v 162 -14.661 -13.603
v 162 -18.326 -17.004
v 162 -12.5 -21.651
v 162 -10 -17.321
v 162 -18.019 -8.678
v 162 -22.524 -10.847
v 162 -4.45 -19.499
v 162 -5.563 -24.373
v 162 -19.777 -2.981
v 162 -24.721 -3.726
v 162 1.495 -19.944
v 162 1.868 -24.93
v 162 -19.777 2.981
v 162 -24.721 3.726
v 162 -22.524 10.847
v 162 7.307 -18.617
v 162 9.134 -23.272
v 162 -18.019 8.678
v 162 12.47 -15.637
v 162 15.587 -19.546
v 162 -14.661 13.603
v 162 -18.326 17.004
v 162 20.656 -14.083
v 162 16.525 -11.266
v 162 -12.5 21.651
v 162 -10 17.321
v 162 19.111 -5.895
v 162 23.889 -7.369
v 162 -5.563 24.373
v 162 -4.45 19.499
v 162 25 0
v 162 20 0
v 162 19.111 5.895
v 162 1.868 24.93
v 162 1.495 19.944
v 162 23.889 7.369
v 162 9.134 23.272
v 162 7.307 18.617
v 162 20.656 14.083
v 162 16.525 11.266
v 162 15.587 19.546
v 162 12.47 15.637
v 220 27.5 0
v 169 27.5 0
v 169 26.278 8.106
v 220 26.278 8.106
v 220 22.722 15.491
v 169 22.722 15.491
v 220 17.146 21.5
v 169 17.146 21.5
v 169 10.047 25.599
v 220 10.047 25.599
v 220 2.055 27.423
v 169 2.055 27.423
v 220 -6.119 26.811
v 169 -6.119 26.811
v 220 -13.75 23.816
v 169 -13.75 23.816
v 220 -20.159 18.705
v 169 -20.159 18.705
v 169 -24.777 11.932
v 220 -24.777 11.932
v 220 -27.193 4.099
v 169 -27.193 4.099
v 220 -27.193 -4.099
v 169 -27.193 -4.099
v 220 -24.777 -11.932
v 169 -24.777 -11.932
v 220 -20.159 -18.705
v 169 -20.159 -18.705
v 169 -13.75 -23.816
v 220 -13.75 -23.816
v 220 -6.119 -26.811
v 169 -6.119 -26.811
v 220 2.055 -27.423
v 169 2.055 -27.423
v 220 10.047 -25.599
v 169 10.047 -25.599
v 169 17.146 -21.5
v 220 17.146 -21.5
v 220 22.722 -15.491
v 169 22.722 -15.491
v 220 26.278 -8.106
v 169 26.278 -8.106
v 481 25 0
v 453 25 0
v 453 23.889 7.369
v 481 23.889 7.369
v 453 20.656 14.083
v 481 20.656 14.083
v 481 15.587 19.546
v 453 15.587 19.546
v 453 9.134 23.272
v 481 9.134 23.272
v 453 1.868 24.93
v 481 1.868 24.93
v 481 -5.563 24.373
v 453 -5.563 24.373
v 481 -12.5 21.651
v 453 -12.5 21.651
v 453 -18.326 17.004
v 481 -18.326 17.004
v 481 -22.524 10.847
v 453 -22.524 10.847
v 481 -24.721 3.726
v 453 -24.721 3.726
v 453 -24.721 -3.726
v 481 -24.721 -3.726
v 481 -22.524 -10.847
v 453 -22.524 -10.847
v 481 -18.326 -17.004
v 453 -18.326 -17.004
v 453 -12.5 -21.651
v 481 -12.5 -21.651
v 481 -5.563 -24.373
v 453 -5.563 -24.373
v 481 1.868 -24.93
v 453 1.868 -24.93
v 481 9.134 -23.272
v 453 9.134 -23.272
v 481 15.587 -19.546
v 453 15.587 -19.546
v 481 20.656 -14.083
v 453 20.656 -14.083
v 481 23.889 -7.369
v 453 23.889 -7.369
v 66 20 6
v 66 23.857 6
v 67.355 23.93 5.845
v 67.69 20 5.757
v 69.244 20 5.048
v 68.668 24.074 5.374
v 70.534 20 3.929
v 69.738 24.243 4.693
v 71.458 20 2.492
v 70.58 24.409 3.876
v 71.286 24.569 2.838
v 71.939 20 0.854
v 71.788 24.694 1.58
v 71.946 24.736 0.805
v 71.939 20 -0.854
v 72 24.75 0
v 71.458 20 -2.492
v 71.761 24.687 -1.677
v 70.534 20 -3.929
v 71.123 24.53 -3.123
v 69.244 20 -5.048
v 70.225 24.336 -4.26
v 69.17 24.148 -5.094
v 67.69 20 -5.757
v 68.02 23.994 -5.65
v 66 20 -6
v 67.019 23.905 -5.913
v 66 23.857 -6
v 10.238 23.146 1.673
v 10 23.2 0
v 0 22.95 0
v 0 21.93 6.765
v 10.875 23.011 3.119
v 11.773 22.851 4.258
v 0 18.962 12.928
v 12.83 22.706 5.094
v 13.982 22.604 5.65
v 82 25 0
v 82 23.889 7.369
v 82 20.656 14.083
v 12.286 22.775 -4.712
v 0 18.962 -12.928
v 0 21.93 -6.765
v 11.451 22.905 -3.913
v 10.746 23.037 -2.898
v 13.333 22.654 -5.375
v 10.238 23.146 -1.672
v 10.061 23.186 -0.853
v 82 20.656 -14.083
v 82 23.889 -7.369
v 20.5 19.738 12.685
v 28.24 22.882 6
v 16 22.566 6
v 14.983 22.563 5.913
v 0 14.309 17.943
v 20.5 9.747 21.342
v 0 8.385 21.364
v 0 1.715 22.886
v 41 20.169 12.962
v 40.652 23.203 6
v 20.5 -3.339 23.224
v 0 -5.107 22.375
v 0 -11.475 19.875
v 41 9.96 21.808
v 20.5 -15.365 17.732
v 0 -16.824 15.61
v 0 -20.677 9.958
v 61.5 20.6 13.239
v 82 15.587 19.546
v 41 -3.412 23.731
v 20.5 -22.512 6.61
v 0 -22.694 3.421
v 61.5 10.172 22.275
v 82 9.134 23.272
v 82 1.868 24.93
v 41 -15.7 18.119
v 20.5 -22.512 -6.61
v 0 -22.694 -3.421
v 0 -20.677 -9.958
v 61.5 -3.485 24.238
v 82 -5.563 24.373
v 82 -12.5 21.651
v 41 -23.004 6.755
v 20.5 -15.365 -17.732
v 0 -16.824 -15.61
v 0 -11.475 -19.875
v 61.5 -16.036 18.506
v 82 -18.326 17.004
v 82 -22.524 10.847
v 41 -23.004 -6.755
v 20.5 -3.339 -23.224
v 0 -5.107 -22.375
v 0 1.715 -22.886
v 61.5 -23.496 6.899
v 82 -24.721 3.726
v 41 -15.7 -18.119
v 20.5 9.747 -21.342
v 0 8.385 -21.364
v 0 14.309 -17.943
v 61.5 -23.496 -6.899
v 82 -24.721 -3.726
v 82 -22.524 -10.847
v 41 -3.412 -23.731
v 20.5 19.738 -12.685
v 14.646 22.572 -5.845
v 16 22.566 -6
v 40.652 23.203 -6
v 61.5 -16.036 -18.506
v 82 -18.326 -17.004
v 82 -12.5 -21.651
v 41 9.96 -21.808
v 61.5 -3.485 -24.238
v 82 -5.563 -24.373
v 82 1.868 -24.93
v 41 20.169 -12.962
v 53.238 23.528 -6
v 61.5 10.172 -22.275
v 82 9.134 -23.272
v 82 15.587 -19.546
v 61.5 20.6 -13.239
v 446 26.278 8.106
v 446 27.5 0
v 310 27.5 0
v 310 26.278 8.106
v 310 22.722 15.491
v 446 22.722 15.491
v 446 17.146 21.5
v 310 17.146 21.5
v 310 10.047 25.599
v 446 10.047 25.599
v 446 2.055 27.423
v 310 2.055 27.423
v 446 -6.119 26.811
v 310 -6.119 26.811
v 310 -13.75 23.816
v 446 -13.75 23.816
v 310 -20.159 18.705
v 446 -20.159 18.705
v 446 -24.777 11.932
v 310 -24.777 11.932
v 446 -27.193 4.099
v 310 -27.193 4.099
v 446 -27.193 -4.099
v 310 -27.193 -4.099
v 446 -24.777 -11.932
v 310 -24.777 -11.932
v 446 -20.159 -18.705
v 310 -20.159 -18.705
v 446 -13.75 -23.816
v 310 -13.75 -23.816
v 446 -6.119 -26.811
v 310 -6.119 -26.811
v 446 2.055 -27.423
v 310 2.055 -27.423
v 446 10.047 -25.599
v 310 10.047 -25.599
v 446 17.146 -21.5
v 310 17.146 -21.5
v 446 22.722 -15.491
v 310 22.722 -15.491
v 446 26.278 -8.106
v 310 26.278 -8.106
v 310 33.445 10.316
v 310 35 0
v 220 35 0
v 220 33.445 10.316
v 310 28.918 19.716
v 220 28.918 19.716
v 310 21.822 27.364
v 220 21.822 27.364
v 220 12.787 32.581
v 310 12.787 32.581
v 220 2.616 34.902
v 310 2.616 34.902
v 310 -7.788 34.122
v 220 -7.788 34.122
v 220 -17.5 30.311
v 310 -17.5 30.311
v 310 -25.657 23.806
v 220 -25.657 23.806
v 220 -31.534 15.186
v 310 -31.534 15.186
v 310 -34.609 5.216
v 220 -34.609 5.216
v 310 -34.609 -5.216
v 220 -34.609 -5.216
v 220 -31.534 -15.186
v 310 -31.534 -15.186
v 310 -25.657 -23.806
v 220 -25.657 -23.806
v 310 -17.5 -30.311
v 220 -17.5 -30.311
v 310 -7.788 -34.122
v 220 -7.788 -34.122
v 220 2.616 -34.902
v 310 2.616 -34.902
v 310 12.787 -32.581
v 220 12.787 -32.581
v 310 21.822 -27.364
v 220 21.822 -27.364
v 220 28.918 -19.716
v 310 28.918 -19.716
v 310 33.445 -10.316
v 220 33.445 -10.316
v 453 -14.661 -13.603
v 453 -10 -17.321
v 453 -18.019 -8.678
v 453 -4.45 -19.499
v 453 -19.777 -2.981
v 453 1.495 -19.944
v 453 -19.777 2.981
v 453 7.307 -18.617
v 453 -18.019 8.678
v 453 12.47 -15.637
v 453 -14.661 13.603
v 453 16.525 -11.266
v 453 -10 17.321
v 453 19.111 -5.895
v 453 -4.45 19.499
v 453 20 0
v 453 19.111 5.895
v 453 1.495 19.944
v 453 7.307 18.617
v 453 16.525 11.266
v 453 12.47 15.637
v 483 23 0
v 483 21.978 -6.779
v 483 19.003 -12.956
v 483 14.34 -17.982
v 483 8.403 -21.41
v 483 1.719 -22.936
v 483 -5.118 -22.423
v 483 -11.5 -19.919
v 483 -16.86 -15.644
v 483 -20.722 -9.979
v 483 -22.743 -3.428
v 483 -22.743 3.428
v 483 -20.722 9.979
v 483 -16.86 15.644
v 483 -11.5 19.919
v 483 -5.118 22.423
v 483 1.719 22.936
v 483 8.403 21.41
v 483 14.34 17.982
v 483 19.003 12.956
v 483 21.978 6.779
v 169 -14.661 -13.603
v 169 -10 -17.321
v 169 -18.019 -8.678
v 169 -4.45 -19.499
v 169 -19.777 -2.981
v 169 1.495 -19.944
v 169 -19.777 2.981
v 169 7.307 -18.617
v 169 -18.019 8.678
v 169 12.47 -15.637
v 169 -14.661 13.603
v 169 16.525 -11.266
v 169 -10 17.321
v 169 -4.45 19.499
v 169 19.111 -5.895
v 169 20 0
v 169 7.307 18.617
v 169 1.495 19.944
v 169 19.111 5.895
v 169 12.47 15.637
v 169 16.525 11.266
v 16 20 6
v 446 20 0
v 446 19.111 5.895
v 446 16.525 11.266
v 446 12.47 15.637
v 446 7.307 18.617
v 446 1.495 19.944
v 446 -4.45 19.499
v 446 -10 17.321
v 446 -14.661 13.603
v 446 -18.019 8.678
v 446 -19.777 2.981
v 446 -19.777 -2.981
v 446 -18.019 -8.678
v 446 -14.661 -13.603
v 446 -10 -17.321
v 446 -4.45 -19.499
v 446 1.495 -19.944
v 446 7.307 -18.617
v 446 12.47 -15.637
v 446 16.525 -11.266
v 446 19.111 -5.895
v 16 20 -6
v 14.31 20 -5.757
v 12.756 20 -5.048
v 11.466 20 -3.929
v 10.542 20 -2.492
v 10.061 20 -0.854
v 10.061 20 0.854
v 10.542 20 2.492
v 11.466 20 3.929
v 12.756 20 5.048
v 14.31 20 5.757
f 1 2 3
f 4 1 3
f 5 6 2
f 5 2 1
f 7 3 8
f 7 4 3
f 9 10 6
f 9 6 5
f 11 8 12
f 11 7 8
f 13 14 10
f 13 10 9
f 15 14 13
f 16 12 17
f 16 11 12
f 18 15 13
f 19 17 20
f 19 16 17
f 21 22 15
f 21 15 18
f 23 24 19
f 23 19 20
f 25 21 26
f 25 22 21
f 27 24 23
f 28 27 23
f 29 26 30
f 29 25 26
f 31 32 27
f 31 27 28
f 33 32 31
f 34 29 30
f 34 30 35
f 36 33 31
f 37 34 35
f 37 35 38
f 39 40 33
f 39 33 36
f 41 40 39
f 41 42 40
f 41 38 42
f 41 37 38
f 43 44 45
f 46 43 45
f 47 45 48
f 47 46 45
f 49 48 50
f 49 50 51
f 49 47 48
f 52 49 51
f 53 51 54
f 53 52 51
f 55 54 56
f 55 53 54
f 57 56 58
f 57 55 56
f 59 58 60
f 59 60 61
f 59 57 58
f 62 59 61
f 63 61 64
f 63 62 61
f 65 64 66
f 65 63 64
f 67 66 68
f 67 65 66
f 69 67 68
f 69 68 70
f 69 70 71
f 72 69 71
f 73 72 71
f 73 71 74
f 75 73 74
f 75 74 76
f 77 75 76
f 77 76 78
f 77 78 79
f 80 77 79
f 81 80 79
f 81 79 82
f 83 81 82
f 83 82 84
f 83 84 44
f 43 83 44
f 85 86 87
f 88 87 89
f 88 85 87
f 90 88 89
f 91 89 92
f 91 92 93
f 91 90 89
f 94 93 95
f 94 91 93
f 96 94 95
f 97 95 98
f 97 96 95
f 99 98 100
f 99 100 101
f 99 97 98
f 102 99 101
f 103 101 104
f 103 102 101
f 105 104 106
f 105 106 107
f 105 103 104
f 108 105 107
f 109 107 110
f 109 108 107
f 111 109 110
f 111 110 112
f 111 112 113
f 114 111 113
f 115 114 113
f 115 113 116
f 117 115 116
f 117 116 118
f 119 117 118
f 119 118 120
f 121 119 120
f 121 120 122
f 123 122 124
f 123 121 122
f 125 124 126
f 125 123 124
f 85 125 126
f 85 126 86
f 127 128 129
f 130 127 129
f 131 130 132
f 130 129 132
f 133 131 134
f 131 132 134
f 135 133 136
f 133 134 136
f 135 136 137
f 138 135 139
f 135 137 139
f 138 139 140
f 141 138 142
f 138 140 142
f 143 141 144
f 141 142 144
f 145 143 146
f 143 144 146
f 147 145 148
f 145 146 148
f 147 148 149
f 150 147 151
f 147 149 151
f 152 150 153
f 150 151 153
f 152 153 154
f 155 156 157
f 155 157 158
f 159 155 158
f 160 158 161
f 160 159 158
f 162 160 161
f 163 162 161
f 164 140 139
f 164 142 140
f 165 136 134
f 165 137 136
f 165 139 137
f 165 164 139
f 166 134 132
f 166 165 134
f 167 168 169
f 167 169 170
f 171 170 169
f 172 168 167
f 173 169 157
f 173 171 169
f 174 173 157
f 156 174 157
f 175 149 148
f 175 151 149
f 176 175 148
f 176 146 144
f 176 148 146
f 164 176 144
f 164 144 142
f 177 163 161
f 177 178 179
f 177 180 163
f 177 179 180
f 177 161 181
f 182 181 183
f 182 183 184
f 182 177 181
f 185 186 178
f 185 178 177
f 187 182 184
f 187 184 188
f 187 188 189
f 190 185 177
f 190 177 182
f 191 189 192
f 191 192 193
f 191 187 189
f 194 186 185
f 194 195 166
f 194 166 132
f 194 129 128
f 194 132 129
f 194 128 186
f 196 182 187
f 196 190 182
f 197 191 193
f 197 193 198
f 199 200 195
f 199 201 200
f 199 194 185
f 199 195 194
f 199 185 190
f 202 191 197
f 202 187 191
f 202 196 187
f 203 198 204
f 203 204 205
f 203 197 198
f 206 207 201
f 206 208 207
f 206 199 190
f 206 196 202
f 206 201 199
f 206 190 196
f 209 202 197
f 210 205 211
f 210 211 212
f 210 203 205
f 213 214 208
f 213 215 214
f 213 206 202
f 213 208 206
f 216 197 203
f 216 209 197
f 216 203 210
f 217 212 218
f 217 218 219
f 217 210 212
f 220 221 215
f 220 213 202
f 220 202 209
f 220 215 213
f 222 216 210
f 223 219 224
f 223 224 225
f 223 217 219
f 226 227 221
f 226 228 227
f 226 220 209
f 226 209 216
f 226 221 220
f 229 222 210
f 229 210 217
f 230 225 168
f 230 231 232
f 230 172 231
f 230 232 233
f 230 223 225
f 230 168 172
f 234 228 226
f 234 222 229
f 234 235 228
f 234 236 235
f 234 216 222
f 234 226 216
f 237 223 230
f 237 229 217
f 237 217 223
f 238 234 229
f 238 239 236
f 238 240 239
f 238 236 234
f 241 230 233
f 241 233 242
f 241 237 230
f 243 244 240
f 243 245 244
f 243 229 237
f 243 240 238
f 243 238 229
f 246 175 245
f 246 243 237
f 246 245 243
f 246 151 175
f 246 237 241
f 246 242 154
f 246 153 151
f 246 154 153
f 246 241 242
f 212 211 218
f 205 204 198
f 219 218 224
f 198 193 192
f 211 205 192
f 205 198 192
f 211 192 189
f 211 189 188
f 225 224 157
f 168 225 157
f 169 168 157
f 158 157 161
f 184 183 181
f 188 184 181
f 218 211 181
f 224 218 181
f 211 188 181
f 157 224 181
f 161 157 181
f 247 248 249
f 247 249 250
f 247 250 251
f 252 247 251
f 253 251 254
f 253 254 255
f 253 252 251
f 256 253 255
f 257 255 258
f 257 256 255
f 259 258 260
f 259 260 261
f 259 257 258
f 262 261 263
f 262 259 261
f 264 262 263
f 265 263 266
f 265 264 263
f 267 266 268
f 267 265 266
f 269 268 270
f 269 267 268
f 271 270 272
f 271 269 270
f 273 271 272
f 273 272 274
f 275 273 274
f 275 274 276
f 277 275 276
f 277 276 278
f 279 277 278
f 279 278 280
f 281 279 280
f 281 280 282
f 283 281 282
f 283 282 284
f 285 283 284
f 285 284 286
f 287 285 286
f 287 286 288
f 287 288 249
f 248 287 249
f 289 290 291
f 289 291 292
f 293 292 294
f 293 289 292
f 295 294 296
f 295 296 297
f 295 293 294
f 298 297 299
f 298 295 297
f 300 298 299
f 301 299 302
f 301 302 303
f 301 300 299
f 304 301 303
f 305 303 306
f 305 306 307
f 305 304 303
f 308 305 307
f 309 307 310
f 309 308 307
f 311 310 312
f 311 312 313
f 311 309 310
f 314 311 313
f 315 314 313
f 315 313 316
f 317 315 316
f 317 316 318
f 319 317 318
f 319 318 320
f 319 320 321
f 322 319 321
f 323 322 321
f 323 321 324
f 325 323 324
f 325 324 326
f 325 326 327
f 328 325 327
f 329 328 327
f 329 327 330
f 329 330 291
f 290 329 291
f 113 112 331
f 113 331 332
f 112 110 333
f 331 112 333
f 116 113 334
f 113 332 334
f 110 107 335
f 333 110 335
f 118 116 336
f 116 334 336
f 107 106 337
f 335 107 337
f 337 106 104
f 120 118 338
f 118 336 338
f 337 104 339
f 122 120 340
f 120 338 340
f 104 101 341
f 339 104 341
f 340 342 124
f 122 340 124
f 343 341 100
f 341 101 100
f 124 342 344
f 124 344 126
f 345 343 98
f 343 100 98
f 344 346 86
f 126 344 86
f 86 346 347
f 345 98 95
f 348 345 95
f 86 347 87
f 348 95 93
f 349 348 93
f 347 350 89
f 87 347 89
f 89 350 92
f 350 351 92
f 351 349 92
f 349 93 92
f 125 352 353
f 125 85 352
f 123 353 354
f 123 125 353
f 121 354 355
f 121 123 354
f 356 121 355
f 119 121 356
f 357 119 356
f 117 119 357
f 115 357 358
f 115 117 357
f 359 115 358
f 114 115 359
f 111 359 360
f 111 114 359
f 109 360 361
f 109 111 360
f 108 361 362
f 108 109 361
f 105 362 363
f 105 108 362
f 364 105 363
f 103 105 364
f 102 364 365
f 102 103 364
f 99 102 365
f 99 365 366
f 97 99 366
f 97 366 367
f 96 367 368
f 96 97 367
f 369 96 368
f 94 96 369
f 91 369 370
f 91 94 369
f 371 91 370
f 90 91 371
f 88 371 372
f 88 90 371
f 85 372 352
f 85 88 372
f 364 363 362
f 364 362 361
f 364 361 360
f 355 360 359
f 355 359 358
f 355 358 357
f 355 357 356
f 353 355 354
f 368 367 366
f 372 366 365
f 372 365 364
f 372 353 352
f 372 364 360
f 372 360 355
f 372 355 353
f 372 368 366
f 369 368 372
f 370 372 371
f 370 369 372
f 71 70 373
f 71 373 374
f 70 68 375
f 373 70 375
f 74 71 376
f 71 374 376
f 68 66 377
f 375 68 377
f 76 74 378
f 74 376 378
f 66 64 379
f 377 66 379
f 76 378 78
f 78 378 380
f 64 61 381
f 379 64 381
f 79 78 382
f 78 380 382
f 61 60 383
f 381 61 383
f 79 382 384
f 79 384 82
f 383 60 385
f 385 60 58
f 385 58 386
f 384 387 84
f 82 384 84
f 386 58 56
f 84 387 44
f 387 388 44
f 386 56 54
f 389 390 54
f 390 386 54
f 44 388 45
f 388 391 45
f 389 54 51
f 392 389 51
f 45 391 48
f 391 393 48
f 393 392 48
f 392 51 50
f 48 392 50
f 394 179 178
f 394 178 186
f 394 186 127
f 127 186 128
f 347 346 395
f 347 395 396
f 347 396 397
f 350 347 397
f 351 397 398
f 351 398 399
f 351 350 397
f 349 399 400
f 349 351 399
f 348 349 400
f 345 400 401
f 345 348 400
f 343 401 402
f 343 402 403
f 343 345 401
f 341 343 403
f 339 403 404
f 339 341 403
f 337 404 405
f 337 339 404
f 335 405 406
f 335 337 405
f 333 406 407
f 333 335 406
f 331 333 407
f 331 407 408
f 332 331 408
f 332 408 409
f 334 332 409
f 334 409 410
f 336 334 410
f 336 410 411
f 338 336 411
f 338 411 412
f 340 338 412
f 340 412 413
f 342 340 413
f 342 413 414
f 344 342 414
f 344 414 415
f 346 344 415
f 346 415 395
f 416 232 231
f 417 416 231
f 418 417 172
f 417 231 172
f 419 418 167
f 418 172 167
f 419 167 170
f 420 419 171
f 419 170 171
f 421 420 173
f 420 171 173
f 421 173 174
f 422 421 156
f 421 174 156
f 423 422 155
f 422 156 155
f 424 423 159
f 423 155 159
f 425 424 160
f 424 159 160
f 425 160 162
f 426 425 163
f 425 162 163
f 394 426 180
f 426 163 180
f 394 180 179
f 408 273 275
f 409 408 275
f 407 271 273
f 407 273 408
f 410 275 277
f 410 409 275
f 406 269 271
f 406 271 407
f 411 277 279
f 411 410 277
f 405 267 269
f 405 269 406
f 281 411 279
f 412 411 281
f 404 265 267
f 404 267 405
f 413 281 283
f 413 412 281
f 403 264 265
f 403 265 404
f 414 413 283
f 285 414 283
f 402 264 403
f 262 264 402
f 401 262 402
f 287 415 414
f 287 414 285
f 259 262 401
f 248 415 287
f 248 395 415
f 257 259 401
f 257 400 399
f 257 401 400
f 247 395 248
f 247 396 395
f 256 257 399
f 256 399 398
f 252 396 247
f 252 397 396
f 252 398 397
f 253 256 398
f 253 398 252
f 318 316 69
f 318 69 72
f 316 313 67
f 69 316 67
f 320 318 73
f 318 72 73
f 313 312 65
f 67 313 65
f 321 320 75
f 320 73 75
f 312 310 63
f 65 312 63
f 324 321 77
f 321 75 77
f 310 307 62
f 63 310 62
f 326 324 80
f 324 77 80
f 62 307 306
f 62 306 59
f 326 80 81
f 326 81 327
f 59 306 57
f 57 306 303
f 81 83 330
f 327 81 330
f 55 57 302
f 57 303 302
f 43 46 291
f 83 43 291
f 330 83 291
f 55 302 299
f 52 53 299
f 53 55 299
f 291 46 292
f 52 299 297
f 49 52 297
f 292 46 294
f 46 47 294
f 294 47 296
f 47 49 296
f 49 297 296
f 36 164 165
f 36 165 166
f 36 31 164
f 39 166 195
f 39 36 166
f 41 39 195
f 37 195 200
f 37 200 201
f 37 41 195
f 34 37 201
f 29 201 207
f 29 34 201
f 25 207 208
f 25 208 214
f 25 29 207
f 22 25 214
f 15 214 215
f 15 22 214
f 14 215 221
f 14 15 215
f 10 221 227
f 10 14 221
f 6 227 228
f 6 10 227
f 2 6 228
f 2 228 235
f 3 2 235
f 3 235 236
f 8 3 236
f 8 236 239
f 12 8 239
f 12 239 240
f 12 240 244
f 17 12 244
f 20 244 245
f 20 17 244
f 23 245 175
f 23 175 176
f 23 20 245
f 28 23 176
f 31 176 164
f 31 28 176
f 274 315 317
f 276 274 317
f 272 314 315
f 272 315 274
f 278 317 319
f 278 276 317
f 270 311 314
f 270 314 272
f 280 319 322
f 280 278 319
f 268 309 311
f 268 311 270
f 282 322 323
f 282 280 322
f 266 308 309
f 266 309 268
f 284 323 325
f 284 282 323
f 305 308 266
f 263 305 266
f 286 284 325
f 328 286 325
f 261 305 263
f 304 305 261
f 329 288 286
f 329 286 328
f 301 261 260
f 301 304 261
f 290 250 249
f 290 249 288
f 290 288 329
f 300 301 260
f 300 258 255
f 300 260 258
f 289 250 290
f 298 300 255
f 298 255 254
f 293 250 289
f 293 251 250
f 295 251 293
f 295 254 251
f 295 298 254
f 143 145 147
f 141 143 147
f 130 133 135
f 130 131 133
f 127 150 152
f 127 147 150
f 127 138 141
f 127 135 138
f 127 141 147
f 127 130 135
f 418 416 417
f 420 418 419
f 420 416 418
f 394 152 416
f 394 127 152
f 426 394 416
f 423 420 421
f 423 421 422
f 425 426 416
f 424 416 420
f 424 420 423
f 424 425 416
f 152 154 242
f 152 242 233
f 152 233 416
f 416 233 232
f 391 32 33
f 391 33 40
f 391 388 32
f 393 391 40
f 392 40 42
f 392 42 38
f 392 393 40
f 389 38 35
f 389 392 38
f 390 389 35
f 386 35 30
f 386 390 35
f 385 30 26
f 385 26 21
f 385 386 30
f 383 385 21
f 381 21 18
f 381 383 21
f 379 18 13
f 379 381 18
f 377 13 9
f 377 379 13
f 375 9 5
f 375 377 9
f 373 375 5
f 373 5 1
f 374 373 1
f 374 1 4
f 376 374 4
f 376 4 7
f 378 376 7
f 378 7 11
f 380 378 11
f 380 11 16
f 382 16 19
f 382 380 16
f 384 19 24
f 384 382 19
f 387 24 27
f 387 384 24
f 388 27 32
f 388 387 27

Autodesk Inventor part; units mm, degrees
ref_plane "Начальная плоскость" through (0, 0, 0) normal (1, 0, 0) x (0, 1, 0)
ref_plane "XY Plane" through (0, 0, 0) normal (0, 0, 1) x (1, 0, 0)
sketch "Основной эскиз" plane through (0, 0, 0) normal (0, 0, 1) x (1, 0, 0)
  line L0 (0, 0) -> (483, 0)
  line L1 (0, 0) -> (0, 22.95)
  line L2 (0, 22.95) -> (82, 25)
  line L3 (162, 25) -> (162, 20)
  line L4 (82, 25) -> (162, 25)
  line L5 (162, 20) -> (169, 20)
  line L6 (169, 20) -> (169, 27.5)
  line L7 (169, 27.5) -> (220, 27.5)
  line L8 (220, 27.5) -> (220, 35)
  line L9 (310, 35) -> (310, 27.5)
  line L10 (220, 35) -> (310, 35)
  line L11 (446, 27.5) -> (446, 20)
  line L12 (310, 27.5) -> (446, 27.5)
  line L13 (446, 20) -> (453, 20)
  line L14 (453, 20) -> (453, 25)
  line L15 (483, 25) -> (483, 0)
  line L16 (453, 25) -> (483, 25)
  dimension "d3" = 50
  dimension "d4" = 40
  dimension "d5" = 55
  dimension "d6" = 70
  dimension "d7" = 55
  dimension "d8" = 40
  dimension "d9" = 50
revolve "Вращение1" add sketch "Основной эскиз" angle 360 about axis through (0, 0, 0) along (1, 0, 0)
chamfer "Фаска1" distance 2 angle 45 1 edges at (483, -25, 0) measured on face at (463, 24.6763, -4.0103)
ref_plane "РабПлоскость1" through (0, 25, 0) normal (0, 1, 0) x (-1, 0, 0)
sketch "Эскиз3" plane through (0, 25, 0) normal (0, 1, 0) x (-1, 0, 0)
  line L0 (-16, 0) -> (-66, 0) construction
  line L1 (-16, 6) -> (-66, 6)
  line L2 (-66, -6) -> (-16, -6)
  arc A0 (-16, -6) -> (-16, 6) centre (-16, 0) ccw
  arc A1 (-66, 6) -> (-66, -6) centre (-66, 0) ccw
  line L3 (0, -22.95) -> (0, 22.95) projected
  line L4 (14.4, 0) -> (-86.4, 0) projected
  point P0 (0, 0)
  point P1 (-41, 0)
  dimension "d15" = 25
  dimension "d16" = 12
  dimension "d17" = 41
extrude "Выдавливание1" cut sketch "Эскиз3" against normal blind 5
equation "\"Length\" = 483"
properties part number "Вал" material "Сталь, углеродистая"
